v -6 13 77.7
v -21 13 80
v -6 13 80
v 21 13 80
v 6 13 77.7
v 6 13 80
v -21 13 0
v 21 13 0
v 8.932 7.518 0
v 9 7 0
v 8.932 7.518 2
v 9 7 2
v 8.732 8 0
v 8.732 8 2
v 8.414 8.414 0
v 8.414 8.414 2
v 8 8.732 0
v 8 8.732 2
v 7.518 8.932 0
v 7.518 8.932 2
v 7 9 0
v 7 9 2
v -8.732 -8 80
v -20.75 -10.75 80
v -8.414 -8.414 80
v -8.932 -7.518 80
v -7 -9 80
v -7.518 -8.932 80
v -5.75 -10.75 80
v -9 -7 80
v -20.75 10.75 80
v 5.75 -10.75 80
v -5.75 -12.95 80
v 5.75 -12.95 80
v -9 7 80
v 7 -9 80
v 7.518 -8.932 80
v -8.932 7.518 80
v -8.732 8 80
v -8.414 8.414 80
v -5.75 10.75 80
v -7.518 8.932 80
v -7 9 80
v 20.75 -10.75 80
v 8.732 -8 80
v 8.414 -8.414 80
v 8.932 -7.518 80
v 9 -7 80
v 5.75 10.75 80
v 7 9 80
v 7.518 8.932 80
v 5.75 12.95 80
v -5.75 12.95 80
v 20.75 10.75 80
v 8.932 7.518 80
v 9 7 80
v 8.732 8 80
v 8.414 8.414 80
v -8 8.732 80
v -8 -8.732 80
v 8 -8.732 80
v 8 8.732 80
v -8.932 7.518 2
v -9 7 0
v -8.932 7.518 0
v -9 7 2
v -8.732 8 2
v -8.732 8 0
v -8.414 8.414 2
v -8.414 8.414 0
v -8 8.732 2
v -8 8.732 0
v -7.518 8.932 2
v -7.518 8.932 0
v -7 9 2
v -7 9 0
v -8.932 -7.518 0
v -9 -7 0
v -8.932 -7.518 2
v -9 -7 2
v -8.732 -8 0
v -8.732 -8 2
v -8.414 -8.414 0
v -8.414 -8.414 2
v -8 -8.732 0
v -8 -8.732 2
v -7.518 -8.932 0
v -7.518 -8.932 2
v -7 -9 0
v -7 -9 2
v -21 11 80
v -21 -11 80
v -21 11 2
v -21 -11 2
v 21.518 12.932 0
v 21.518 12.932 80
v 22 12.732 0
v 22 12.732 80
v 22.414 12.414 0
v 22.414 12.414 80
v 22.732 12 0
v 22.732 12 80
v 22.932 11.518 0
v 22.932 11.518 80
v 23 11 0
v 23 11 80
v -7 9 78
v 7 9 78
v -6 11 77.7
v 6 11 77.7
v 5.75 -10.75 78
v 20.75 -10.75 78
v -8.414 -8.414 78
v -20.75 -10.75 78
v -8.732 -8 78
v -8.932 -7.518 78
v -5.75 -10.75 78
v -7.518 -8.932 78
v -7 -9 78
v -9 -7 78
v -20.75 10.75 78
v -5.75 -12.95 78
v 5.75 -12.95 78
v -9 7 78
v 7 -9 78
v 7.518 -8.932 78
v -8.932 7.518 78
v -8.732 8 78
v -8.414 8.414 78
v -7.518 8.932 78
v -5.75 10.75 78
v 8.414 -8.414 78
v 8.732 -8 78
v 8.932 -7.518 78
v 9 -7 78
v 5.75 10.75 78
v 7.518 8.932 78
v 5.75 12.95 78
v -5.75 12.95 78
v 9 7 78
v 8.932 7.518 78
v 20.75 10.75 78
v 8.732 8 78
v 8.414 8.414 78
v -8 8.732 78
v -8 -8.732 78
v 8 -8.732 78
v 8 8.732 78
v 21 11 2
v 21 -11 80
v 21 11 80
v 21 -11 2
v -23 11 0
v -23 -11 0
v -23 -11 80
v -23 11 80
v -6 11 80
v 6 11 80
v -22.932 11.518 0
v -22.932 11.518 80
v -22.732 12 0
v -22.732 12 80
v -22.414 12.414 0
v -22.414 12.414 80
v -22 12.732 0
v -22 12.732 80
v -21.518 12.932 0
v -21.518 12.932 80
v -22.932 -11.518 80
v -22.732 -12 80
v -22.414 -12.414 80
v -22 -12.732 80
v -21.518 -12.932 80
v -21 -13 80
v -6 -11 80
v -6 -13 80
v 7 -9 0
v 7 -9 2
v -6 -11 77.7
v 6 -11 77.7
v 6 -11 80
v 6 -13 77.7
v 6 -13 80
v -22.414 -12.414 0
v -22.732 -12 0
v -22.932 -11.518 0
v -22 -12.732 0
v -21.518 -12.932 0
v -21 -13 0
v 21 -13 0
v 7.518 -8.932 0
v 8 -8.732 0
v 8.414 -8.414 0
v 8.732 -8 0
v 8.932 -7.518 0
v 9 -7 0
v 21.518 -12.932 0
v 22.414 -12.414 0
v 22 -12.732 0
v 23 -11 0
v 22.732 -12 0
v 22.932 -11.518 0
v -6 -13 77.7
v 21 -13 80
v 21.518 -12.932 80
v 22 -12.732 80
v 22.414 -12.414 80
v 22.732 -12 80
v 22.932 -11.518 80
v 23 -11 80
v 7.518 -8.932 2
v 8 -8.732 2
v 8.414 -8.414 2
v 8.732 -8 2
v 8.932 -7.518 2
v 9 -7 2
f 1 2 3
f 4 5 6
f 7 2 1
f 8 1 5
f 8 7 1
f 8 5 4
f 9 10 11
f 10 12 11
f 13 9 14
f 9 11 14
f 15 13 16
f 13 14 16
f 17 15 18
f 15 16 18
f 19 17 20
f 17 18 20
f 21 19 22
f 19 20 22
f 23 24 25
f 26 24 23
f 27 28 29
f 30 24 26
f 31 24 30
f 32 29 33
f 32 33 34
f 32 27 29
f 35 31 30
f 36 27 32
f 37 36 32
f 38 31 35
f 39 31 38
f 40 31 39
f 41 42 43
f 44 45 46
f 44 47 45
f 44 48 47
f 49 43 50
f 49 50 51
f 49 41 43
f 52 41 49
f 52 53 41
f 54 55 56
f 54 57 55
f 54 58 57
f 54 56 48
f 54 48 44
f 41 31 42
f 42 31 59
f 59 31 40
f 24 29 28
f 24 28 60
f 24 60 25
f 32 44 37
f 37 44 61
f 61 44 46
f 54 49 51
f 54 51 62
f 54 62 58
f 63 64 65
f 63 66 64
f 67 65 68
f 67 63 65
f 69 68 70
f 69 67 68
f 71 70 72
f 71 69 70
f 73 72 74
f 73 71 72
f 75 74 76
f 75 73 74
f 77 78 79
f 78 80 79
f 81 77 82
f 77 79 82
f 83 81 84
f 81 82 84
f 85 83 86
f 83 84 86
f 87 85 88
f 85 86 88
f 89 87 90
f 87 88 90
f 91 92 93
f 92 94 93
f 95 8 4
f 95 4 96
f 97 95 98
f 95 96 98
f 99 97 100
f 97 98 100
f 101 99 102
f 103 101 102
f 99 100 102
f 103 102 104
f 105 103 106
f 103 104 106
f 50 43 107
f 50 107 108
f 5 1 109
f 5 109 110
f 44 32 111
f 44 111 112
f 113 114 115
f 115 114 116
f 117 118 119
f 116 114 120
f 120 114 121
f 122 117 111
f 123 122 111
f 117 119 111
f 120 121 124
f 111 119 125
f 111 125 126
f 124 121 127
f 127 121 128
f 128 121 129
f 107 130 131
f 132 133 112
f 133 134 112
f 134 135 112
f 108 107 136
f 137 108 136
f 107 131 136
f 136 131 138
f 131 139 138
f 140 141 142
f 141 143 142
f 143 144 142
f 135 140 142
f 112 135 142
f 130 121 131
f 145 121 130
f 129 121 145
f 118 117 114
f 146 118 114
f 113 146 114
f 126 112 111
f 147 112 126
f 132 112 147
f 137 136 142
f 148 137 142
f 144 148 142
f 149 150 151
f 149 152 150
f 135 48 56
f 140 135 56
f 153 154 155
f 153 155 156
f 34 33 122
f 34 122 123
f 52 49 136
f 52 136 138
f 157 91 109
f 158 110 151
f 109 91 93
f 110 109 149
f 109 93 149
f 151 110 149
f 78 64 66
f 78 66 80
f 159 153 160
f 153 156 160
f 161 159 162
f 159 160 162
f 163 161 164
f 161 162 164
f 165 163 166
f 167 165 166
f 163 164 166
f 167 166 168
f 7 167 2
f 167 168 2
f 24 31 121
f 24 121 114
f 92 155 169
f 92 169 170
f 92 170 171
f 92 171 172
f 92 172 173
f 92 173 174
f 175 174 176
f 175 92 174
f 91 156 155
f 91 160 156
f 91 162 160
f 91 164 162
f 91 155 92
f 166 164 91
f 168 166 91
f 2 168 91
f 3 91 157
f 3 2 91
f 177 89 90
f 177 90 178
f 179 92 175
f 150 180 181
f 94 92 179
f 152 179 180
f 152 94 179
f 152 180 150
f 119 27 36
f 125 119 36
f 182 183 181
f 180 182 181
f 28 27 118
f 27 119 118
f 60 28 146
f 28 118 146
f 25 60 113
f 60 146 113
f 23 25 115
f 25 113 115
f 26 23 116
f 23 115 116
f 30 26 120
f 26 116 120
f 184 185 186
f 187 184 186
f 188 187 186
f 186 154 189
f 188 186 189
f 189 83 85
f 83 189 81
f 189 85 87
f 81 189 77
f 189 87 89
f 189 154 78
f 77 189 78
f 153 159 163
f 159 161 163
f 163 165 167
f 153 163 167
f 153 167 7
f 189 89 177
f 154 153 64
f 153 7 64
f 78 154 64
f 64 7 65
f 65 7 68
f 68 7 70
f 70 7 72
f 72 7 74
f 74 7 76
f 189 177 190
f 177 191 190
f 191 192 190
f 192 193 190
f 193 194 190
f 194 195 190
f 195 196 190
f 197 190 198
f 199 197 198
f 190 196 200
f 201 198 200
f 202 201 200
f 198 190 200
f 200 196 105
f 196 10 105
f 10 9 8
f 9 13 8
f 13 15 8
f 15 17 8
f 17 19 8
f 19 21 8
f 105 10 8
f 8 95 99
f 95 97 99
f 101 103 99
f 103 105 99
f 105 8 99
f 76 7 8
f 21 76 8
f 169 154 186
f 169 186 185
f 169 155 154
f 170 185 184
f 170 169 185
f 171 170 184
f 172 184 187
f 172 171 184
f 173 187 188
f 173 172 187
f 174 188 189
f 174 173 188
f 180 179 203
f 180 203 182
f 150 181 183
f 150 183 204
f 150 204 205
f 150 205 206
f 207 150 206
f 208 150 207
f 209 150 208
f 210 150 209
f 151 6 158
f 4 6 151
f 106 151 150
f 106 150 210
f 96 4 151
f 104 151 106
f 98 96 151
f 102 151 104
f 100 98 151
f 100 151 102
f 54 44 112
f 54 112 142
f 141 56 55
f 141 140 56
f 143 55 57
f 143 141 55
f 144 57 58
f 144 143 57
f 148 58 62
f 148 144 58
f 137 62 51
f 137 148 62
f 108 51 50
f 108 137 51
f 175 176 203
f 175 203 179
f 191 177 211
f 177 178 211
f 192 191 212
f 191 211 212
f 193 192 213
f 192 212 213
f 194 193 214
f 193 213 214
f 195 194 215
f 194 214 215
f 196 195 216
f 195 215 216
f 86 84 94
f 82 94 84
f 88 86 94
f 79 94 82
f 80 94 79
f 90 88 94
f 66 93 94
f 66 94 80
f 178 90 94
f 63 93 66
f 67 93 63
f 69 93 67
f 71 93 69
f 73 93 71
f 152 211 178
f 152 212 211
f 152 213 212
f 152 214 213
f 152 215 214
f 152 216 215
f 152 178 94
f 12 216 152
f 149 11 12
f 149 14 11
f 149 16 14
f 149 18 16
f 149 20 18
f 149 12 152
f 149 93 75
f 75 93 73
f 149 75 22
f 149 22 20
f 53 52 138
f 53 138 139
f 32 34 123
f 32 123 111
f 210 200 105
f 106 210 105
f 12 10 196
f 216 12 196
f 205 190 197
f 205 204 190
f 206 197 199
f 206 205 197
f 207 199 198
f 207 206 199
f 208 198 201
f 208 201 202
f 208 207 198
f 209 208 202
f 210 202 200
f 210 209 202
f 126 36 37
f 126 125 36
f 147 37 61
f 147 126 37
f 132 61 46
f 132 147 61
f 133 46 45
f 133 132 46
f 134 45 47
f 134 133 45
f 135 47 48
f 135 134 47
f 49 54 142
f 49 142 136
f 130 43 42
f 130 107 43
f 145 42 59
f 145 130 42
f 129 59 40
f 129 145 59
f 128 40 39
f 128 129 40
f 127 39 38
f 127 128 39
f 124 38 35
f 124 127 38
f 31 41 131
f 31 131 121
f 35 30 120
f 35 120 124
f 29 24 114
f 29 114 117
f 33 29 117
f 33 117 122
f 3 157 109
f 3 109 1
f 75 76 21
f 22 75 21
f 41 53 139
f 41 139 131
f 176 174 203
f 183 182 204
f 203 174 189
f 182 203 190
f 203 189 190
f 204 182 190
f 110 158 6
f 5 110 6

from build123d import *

# Parameters (mm, degrees)
F0_W      = 46
F0_H      = 26
F1_DEPTH  = 80
F2_T      = -2
F3_W      = 12
F3_H      = 2
F4_DEPTH  = 2.3
F7_DEPTH  = 2
F8_R      = 2
F9_R      = 5
F10_DEPTH = 25
F11_W     = 18
F11_H     = 18
F12_DEPTH = 25
F13_R     = 2
F14_W     = 18
F14_H     = 18
F15_DEPTH = 25
F16_R     = 2


with BuildPart() as f1:
    # F0 (on Top) → F1 (new body)
    with BuildSketch(Plane.XY):
        Rectangle(F0_W, F0_H)
    extrude(amount=F1_DEPTH)

    # F2
    f2_openings = [f1.faces().sort_by_distance(p)[0] for p in [
        (0, 0, 80),
    ]]
    offset(amount=F2_T, openings=f2_openings)

    # F3 (on face) → F4 (cut)
    with BuildSketch(Plane.XY.offset(80)):
        with Locations((0, 12)):
            Rectangle(F3_W, F3_H)
        with Locations((0, -12)):
            Rectangle(F3_W, F3_H)
    extrude(amount=-F4_DEPTH, mode=Mode.SUBTRACT)

    # F8
    f8_edges = [f1.edges().sort_by_distance(p)[0] for p in [
        (-23, 13, 40),
        (23, 13, 40),
        (23, -13, 40),
        (-23, -13, 40),
    ]]
    fillet(f8_edges, radius=F8_R)

    # F9 (on face) → F10 (cut)
    with BuildSketch(Plane(origin=(0, 0, 0), x_dir=(1, 0, 0), z_dir=(0, 0, -1))):
        Circle(F9_R)
    extrude(amount=-F10_DEPTH, mode=Mode.SUBTRACT)

    # F14 (on face) → F15 (cut)
    with BuildSketch(Plane(origin=(0, 0, 0), x_dir=(1, 0, 0), z_dir=(0, 0, -1))):
        Rectangle(F14_W, F14_H)
    extrude(amount=-F15_DEPTH, mode=Mode.SUBTRACT)

    # F16
    f16_edges = [f1.edges().sort_by_distance(p)[0] for p in [
        (9, 9, 1),
        (9, -9, 1),
        (-9, -9, 1),
        (-9, 9, 1),
    ]]
    fillet(f16_edges, radius=F16_R)


with BuildPart() as f7:
    # F6 (on offset) → F7 (new body)
    with BuildSketch(Plane.XY.offset(80)):
        Polygon((-5.75, 10.75), (-20.75, 10.75), (-20.75, -10.75), (-5.75, -10.75), (-5.75, -12.95), (5.75, -12.95), (5.75, -10.75), (20.75, -10.75), (20.75, 10.75), (5.75, 10.75), (5.75, 12.95), (-5.75, 12.95), align=None)
    extrude(amount=-F7_DEPTH)

    # F11 (on face) → F12 (cut)
    with BuildSketch(Plane.XY.offset(80)):
        Rectangle(F11_W, F11_H)
    extrude(amount=-F12_DEPTH, mode=Mode.SUBTRACT)

    # F13
    f13_edges = [f7.edges().sort_by_distance(p)[0] for p in [
        (-9, 9, 79),
        (9, 9, 79),
        (-9, -9, 79),
        (9, -9, 79),
    ]]
    fillet(f13_edges, radius=F13_R)


solid = Compound([f1.part, f7.part])
